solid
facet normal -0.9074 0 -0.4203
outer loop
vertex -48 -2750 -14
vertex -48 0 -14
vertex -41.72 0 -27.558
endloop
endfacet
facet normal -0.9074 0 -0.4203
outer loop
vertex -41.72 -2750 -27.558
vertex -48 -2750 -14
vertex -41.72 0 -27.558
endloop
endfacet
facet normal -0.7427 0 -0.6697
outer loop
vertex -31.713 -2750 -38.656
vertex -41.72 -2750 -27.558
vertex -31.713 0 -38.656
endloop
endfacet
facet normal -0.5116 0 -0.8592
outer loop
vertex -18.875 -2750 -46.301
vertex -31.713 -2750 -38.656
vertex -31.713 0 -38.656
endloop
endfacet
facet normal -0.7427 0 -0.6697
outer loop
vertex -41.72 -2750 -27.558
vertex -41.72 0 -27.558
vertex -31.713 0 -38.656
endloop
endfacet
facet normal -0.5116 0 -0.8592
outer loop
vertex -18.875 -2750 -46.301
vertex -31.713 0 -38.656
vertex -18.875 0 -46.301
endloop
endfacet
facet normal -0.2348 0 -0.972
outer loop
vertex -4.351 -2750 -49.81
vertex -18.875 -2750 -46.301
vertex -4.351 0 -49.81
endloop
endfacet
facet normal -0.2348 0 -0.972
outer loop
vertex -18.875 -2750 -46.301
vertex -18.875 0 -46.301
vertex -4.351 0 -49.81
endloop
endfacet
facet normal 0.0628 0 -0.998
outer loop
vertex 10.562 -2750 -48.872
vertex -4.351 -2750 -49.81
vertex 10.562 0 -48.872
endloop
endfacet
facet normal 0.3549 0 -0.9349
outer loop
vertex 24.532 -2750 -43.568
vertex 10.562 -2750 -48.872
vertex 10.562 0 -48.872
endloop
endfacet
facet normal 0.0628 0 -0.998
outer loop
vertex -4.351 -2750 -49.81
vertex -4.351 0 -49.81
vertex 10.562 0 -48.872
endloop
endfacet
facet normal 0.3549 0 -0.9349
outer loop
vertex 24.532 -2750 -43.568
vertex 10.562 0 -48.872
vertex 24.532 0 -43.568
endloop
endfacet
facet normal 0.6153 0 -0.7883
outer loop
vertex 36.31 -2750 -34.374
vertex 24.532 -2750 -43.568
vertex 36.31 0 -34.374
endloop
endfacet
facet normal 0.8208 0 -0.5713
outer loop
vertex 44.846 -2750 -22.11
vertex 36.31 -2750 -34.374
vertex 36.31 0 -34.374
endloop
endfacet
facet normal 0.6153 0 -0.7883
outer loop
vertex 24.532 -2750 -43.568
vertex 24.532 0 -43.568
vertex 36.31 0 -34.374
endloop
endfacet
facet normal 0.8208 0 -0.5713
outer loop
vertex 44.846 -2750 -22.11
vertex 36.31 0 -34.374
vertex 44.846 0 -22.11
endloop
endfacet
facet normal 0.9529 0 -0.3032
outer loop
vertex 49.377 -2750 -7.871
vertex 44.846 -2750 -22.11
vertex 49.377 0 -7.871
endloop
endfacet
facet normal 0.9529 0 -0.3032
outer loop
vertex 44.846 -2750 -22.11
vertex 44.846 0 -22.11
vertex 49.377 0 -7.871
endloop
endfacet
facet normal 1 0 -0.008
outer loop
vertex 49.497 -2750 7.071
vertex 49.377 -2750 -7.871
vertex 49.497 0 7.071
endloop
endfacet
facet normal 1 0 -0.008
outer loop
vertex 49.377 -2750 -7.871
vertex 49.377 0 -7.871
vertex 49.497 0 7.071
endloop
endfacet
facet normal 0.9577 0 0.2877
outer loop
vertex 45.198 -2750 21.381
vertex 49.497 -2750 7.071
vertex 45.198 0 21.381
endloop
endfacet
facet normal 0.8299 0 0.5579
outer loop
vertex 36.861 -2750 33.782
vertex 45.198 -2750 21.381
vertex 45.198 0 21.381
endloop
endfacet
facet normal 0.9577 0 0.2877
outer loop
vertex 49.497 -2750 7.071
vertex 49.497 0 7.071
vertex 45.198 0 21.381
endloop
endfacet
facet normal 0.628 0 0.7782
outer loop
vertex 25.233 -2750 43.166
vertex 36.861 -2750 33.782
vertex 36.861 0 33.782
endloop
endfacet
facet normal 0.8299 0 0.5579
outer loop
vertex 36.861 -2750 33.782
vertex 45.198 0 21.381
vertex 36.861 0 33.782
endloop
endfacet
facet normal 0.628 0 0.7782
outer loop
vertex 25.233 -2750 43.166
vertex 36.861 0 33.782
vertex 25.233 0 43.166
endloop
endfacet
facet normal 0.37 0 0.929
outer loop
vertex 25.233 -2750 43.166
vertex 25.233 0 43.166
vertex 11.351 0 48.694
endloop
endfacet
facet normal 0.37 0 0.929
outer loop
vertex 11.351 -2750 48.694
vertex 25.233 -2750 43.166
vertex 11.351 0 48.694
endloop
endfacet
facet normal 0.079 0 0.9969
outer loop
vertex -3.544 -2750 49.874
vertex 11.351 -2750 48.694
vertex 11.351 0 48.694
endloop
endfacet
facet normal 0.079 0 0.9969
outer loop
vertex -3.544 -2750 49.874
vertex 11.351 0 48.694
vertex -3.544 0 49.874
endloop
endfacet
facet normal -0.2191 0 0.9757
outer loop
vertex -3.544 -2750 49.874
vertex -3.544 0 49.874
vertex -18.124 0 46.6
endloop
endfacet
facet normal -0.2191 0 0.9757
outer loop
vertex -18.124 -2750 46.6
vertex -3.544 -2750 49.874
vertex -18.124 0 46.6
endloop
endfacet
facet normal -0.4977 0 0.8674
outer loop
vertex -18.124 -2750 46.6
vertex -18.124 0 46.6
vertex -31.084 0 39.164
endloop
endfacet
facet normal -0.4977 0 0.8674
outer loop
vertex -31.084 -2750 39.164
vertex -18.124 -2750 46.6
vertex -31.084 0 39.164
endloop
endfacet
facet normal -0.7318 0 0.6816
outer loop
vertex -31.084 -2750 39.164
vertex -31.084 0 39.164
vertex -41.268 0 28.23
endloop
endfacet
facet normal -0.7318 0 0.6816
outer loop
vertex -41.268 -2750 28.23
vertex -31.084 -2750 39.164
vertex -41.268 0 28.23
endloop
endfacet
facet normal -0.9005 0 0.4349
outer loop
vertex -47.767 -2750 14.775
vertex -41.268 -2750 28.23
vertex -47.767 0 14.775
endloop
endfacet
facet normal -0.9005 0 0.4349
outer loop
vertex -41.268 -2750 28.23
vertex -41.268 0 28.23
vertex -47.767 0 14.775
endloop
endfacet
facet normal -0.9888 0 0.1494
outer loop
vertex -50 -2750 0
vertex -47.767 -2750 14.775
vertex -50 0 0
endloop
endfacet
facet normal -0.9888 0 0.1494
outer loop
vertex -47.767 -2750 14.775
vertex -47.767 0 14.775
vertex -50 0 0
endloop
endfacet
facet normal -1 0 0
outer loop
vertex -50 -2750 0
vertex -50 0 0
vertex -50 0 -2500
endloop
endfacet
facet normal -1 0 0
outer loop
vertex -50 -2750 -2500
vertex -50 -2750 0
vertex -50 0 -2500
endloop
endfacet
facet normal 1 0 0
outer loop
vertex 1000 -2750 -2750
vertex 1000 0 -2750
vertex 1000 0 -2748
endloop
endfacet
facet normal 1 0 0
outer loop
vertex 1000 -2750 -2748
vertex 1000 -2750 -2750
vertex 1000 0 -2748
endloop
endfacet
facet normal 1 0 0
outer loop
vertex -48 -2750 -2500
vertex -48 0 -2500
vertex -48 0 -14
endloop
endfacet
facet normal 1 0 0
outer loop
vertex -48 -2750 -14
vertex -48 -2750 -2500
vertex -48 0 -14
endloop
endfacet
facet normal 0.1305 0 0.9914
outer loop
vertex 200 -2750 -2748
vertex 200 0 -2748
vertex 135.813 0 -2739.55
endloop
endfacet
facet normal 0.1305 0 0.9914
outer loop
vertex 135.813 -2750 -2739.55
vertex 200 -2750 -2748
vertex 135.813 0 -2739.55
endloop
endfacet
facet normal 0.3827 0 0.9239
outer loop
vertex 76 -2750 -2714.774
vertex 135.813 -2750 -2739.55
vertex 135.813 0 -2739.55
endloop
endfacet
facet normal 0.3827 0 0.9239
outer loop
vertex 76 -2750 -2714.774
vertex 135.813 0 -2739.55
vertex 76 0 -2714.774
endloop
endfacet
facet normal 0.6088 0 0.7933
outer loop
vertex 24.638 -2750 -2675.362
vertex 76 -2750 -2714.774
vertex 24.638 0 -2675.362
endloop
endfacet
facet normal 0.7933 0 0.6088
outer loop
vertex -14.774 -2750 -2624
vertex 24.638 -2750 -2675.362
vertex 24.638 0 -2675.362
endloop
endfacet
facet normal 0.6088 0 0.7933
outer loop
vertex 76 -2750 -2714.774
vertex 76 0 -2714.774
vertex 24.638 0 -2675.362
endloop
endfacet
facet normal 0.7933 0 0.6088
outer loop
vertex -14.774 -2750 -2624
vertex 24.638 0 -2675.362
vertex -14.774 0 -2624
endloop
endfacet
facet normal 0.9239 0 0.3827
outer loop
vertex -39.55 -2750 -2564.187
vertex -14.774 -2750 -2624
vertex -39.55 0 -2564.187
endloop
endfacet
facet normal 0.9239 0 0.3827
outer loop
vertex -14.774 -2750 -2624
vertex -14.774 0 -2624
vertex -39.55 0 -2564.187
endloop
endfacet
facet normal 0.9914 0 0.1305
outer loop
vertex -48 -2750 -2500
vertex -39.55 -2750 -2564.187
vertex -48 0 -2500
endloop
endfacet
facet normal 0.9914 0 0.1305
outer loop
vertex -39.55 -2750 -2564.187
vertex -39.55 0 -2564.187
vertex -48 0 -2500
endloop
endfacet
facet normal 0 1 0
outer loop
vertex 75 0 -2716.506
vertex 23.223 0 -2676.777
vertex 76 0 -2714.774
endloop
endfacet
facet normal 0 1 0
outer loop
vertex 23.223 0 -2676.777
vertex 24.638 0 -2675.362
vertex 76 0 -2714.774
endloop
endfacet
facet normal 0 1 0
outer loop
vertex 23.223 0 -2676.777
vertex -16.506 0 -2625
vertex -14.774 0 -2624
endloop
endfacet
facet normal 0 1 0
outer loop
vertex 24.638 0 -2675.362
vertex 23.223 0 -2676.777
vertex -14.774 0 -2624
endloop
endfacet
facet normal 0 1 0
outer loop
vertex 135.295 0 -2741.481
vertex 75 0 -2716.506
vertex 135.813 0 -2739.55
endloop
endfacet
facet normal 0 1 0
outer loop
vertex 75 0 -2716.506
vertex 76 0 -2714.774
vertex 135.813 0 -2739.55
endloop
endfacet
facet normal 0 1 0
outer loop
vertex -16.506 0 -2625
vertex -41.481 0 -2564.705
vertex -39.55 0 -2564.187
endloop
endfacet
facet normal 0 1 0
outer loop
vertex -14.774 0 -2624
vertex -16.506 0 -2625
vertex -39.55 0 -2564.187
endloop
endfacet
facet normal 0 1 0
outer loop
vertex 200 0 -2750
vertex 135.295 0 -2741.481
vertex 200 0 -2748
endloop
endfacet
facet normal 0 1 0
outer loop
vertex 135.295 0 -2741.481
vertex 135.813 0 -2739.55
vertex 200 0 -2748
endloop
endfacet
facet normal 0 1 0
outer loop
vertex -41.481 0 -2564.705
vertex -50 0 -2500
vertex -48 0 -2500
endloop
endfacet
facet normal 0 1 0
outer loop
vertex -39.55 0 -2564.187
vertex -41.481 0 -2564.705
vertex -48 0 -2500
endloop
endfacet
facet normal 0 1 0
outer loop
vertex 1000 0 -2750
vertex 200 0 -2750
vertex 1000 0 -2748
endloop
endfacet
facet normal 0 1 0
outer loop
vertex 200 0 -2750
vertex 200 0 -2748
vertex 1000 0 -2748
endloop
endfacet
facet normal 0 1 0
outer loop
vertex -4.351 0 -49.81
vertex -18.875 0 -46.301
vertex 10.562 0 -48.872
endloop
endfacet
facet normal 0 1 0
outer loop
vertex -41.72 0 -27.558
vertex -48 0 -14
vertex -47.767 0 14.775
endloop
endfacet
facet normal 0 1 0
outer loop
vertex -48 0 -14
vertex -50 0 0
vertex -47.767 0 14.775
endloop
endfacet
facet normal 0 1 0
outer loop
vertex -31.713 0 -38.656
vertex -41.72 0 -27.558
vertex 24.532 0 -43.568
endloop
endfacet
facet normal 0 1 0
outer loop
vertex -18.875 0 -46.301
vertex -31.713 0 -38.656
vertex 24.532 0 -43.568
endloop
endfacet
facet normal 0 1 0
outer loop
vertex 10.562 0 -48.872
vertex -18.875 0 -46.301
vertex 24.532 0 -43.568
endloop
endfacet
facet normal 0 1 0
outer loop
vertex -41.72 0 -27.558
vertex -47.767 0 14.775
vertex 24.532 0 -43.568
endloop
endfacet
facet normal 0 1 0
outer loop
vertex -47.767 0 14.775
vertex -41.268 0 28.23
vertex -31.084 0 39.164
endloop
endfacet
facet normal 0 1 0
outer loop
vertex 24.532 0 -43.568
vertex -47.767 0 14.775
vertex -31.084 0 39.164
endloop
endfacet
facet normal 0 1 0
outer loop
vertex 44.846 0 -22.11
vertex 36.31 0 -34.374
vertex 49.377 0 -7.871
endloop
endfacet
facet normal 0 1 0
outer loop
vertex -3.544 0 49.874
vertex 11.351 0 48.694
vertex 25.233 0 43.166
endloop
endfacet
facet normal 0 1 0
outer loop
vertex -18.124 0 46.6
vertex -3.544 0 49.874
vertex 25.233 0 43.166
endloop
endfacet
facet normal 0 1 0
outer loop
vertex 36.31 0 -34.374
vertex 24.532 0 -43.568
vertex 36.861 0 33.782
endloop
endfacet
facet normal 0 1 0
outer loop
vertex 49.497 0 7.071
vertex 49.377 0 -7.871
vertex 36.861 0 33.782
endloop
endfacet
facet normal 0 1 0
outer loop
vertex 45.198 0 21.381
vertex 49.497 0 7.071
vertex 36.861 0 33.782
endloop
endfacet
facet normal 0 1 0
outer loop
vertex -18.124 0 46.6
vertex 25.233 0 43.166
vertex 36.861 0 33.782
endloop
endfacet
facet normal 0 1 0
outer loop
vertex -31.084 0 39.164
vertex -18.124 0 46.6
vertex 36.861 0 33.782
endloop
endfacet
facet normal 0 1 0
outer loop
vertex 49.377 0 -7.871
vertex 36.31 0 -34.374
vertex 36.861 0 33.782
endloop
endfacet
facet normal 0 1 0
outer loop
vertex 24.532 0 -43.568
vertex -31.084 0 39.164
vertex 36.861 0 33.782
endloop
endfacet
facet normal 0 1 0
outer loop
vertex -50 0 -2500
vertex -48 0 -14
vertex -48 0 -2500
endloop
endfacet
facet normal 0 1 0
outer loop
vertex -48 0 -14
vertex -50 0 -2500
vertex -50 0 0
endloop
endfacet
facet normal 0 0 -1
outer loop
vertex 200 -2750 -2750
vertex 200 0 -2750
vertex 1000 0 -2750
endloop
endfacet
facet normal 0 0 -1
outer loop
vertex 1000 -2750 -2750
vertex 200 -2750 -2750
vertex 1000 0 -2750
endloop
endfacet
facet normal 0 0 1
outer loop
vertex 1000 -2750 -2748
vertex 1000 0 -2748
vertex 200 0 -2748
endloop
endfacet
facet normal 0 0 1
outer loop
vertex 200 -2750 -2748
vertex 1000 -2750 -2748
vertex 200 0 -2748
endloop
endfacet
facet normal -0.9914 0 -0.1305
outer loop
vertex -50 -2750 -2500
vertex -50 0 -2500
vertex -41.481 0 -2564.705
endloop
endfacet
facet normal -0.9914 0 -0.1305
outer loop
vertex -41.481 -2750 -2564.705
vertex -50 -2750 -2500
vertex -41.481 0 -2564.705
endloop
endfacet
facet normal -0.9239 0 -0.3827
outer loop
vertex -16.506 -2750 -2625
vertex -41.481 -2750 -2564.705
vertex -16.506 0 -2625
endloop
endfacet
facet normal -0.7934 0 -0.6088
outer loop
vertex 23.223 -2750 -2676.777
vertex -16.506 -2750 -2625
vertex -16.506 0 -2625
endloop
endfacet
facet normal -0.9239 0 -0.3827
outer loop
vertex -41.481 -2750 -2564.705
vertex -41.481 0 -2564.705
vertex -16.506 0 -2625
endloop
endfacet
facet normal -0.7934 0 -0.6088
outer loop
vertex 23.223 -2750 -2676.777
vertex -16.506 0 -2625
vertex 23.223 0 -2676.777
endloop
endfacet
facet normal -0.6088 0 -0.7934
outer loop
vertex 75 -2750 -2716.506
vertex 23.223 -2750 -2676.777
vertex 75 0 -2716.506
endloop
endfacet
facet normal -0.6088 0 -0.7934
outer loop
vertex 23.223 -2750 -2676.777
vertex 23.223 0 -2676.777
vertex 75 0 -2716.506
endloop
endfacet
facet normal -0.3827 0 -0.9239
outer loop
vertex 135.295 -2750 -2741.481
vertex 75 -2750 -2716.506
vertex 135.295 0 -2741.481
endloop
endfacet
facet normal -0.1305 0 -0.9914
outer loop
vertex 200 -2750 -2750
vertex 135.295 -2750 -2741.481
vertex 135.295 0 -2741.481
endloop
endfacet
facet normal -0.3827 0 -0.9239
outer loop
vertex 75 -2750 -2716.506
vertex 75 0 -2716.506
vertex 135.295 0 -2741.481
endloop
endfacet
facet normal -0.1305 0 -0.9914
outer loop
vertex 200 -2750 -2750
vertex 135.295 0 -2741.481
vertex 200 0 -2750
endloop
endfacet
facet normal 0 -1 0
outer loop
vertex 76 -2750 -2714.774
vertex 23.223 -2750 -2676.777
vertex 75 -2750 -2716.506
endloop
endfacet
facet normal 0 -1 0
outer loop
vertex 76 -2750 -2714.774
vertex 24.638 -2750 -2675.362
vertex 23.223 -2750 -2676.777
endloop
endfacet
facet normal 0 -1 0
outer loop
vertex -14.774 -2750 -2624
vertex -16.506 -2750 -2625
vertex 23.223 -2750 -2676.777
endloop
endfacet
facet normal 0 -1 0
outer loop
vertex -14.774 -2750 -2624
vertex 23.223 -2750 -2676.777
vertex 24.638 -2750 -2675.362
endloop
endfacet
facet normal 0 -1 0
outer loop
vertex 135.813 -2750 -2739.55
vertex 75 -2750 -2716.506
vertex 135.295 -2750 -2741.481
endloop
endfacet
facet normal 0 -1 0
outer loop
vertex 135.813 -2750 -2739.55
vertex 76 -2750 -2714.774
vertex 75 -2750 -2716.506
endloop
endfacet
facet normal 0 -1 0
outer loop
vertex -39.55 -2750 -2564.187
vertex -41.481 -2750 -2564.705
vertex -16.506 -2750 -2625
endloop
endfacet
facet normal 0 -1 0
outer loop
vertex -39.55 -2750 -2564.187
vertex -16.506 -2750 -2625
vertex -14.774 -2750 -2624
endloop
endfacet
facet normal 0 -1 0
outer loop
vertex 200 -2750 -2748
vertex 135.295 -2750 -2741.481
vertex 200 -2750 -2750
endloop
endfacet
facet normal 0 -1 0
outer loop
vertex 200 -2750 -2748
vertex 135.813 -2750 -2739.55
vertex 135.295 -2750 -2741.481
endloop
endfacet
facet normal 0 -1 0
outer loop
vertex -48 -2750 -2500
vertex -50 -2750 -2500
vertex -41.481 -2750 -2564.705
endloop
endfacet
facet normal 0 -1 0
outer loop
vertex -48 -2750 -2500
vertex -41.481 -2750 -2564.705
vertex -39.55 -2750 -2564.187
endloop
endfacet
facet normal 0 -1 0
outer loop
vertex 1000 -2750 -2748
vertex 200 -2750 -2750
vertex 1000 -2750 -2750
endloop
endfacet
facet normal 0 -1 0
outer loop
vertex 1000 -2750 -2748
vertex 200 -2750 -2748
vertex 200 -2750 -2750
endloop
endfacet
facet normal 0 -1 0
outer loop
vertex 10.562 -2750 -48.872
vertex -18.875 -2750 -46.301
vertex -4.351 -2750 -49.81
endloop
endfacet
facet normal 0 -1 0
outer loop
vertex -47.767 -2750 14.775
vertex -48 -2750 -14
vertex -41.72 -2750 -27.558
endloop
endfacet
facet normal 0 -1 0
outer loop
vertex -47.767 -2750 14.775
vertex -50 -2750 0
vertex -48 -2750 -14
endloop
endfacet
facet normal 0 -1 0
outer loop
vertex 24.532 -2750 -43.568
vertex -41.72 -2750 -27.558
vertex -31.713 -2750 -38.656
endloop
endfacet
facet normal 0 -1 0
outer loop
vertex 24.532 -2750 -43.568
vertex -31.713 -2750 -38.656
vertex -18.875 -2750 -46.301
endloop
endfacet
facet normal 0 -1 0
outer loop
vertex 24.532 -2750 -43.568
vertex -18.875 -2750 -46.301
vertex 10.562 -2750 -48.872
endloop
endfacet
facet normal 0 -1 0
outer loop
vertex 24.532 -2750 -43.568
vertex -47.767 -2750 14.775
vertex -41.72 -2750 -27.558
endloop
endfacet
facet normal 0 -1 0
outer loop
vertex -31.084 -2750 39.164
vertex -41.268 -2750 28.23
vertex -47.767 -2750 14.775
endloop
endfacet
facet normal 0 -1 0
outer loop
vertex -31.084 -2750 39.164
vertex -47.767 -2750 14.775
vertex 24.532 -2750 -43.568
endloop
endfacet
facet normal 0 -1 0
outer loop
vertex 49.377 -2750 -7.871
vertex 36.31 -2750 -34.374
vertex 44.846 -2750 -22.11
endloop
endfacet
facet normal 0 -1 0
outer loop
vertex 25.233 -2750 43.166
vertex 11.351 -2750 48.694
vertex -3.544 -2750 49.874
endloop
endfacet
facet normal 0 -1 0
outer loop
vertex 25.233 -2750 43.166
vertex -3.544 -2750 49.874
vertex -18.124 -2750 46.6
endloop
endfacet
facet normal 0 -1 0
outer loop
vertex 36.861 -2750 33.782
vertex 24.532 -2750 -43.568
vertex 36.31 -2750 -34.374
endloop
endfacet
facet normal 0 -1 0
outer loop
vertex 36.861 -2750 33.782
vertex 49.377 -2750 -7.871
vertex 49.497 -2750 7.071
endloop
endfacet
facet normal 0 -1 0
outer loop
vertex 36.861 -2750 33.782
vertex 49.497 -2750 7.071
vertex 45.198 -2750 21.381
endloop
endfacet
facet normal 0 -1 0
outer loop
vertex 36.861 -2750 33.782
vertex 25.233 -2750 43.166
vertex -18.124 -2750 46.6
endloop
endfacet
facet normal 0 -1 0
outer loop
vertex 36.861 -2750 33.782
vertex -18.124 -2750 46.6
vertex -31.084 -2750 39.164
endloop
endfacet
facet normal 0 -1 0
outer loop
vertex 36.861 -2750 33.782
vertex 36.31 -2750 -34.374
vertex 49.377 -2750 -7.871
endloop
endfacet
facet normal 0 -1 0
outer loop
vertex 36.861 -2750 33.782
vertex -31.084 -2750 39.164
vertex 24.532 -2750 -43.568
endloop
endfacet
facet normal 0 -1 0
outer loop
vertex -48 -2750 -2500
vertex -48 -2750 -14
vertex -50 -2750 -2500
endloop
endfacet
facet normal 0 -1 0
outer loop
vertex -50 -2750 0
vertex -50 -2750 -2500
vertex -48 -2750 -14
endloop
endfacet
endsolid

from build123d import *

# Parameters (mm, degrees)
F1_DEPTH = 2750


with BuildPart() as f1:
    # F0 (on Front) → F1 (new body)
    with BuildSketch(Plane.XZ):
        with BuildLine():
            Line((-48, -2500), (-48, -14))
            ThreePointArc((-48, -14), (49.497475, 7.071068), (-50, 0))
            Line((-50, 0), (-50, -2500))
            ThreePointArc((-50, -2500), (23.223305, -2676.776695), (200, -2750))
            Line((200, -2750), (1000, -2750))
            Line((1000, -2750), (1000, -2748))
            Line((1000, -2748), (200, -2748))
            ThreePointArc((200, -2748), (24.637518, -2675.362482), (-48, -2500))
        make_face()
    extrude(amount=F1_DEPTH)


solid = f1.part
